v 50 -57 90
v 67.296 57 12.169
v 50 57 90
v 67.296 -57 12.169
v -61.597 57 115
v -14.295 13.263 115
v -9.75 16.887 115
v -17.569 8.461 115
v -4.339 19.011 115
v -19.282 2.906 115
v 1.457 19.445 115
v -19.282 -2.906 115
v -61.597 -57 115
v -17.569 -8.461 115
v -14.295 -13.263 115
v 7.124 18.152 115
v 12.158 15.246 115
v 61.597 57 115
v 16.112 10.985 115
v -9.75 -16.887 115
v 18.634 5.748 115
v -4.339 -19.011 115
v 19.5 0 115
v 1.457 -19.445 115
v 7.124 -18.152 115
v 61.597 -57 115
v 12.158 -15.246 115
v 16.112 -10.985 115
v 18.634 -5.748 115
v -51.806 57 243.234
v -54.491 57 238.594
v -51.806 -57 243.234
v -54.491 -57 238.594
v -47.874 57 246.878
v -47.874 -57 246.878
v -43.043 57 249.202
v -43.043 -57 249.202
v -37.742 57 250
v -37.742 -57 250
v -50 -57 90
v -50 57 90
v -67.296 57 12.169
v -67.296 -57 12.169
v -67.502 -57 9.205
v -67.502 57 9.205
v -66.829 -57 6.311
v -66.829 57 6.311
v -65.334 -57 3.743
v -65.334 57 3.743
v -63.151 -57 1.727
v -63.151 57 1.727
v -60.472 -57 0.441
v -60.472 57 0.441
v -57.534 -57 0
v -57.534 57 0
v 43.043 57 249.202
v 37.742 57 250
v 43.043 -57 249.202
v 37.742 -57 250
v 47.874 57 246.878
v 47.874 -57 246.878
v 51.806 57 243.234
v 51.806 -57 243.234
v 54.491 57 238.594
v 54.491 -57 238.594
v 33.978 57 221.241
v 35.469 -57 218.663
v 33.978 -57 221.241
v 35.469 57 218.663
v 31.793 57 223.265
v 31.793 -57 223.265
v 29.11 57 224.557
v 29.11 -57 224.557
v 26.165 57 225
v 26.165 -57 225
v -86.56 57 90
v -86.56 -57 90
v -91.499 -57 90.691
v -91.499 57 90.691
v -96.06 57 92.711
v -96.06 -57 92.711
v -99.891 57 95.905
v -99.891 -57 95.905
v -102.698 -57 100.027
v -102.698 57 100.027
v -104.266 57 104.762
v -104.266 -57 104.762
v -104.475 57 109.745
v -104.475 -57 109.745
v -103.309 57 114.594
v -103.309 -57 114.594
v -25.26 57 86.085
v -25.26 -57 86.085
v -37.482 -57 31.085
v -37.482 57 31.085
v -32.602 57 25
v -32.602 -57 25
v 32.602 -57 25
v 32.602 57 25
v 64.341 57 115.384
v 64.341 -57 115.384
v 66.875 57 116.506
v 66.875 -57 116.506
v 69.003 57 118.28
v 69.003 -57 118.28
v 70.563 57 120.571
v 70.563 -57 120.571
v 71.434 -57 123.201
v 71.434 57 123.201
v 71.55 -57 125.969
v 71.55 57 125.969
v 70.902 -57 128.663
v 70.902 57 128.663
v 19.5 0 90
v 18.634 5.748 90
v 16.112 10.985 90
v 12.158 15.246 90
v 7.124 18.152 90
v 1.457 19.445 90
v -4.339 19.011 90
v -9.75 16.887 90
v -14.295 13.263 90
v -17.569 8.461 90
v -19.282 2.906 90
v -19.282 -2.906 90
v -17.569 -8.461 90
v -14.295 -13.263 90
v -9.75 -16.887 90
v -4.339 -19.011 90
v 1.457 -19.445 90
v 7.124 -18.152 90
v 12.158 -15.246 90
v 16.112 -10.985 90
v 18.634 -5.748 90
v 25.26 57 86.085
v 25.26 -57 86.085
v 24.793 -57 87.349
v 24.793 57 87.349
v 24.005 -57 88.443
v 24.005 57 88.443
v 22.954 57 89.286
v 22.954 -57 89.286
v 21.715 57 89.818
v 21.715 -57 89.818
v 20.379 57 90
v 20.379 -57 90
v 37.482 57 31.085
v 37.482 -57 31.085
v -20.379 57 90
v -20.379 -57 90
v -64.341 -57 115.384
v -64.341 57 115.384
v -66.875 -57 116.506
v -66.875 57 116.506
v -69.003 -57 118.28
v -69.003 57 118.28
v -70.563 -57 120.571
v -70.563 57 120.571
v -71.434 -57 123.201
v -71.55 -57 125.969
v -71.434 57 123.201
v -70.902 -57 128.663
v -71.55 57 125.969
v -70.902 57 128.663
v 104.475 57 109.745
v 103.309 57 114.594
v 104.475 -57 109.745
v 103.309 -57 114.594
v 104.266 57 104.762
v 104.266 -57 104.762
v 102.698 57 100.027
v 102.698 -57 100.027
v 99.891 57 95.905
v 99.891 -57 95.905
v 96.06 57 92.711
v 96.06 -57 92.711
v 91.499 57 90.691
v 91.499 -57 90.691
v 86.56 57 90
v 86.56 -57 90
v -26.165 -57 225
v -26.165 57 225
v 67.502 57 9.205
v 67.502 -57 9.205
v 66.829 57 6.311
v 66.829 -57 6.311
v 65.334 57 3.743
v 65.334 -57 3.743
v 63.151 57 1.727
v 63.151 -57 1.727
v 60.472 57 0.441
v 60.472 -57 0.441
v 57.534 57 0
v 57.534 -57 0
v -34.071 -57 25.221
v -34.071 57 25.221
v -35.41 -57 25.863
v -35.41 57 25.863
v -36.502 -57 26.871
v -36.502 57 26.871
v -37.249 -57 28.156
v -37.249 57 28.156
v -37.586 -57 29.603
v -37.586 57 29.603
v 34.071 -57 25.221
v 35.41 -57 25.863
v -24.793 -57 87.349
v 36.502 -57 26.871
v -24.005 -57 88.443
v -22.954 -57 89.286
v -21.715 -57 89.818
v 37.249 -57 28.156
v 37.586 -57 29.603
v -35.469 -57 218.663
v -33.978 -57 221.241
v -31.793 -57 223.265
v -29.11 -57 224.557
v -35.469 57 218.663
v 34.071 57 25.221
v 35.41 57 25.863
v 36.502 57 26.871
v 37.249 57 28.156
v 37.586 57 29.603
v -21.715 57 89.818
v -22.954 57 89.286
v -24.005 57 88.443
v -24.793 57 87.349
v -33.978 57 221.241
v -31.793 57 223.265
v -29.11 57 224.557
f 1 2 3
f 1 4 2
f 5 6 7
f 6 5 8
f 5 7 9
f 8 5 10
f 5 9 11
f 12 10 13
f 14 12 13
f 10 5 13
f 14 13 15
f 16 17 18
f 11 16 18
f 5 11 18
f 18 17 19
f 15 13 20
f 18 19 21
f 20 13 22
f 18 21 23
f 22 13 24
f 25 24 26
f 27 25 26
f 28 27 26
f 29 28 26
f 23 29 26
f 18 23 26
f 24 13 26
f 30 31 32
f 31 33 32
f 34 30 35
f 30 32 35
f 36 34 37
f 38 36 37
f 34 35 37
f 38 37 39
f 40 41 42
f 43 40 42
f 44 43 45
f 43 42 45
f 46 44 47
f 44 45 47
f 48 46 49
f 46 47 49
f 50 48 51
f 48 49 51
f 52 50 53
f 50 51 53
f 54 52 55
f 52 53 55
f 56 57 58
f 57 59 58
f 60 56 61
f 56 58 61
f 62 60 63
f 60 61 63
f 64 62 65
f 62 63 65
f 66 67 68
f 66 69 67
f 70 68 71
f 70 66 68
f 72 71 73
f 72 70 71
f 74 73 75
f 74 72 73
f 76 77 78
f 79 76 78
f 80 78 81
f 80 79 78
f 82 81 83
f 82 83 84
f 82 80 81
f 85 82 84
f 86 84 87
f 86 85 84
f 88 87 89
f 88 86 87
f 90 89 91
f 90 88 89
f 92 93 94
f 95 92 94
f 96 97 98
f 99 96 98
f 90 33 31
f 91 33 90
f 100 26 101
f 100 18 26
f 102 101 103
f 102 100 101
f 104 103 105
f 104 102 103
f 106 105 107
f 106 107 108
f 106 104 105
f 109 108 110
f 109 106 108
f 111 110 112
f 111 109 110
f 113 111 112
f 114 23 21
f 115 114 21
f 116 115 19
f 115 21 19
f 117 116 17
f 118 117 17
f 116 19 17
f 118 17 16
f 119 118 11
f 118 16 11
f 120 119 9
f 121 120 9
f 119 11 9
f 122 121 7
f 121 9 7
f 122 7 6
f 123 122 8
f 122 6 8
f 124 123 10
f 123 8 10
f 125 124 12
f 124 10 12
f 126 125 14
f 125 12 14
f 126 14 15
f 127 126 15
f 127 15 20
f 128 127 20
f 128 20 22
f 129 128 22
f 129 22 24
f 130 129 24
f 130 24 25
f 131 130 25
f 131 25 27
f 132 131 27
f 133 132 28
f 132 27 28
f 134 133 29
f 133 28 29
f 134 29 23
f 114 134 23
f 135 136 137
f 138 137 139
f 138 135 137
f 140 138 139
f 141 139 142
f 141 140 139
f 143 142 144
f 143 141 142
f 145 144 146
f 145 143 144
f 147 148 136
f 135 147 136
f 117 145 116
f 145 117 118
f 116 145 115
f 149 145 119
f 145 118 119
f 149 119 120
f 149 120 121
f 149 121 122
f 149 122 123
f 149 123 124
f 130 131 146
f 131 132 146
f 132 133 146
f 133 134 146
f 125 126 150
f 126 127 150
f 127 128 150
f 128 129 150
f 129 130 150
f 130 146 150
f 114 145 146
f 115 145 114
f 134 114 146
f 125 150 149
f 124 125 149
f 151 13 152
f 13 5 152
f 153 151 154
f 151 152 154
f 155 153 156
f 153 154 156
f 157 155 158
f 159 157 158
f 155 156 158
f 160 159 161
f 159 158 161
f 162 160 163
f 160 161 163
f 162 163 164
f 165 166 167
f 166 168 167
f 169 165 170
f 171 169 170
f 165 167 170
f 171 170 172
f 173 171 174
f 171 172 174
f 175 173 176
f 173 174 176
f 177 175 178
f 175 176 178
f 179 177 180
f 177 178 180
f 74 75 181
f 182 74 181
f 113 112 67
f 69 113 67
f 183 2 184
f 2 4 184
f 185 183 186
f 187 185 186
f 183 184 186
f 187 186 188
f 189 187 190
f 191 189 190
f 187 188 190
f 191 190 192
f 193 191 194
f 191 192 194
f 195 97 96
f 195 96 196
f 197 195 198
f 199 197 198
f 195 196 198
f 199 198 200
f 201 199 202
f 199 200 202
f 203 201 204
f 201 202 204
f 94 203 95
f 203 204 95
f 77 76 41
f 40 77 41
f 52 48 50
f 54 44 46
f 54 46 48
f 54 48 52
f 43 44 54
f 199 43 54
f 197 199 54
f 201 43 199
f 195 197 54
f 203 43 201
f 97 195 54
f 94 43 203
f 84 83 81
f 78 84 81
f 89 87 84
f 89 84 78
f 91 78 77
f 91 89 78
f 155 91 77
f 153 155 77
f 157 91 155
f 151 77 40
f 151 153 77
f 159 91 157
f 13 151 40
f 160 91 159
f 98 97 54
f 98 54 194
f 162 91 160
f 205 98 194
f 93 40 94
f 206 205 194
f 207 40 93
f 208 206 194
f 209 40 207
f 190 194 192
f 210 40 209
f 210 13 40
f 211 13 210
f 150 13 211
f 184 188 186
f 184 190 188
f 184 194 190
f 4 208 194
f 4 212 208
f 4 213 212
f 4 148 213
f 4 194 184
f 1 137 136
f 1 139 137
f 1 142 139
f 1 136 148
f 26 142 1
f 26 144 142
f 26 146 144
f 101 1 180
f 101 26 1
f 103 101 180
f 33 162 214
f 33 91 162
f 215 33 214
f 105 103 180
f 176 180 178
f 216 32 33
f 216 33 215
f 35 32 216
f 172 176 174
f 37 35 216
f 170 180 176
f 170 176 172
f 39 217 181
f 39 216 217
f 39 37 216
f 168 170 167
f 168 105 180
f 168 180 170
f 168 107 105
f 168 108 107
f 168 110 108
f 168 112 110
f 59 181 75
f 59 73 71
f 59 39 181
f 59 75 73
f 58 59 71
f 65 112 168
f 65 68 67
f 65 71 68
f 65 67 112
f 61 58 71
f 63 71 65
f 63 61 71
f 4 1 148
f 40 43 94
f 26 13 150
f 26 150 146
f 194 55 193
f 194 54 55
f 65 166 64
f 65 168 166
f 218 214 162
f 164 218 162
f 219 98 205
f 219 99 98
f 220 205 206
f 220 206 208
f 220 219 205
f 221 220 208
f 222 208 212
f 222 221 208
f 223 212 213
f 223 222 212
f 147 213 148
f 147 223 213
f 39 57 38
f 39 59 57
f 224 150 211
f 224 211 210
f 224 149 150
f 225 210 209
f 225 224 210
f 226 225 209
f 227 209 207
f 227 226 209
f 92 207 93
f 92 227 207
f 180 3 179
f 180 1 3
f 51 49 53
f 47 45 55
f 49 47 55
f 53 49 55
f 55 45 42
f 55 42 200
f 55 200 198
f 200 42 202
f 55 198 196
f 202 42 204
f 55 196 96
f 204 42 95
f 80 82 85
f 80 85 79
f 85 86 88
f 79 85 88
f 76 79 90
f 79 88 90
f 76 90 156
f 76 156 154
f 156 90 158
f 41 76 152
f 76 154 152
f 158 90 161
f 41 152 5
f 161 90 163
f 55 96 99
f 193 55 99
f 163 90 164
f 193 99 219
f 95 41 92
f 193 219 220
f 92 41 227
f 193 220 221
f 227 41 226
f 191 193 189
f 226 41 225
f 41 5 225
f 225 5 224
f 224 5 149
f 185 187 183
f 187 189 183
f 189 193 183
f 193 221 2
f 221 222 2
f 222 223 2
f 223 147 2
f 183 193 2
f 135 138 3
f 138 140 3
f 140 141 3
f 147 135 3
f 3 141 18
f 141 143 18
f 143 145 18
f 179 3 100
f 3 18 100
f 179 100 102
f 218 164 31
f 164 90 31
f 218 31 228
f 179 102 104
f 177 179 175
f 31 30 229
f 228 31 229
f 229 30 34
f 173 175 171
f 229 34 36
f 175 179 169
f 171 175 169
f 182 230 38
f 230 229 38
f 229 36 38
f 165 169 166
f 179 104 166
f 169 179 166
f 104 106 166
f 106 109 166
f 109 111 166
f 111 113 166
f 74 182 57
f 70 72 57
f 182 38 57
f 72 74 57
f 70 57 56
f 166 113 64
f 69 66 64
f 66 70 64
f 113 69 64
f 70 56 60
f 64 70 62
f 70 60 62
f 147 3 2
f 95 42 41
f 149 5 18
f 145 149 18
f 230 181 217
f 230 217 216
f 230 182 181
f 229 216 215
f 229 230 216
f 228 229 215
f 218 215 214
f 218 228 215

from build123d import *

# Parameters (mm, degrees)
F1_DEPTH  = 57
F2_R      = 18
F3_R      = 10
F5_DEPTH  = 114
F6_R      = 5
F8_DEPTH  = 114
F9_R      = 10
F10_R     = 19.5
F11_DEPTH = 25


with BuildPart() as f1:
    # F0 (on Front) → F1 (new body, symmetric)
    with BuildSketch(Plane.XZ):
        Polygon((-70, 0), (70, 0), (50, 90), (112.991273, 90), (50, 250), (-50, 250), (-112.991273, 90), (-50, 90), align=None)
    extrude(amount=F1_DEPTH, both=True)

    # F2
    f2_edges = [f1.edges().sort_by_distance(p)[0] for p in [
        (50, 0, 250),
        (-50, 0, 250),
        (112.991273, 0, 90),
        (-112.991273, 0, 90),
    ]]
    fillet(f2_edges, radius=F2_R)

    # F3
    f3_edges = [f1.edges().sort_by_distance(p)[0] for p in [
        (70, 0, 0),
        (-70, 0, 0),
    ]]
    fillet(f3_edges, radius=F3_R)

    # F4 (on face) → F5 (cut, through all)
    with BuildSketch(Plane.XZ.offset(57)):
        Polygon((-38.834599, 25), (38.834599, 25), (24.390154, 90), (-24.390154, 90), align=None)
    extrude(amount=-F5_DEPTH, mode=Mode.SUBTRACT)

    # F6
    f6_edges = [f1.edges().sort_by_distance(p)[0] for p in [
        (-38.834599, 0, 25),
        (38.834599, 0, 25),
        (-24.390154, 0, 90),
        (24.390154, 0, 90),
    ]]
    fillet(f6_edges, radius=F6_R)

    # F7 (on face) → F8 (cut, through all)
    with BuildSketch(Plane.XZ.offset(57)):
        Polygon((-76.281201, 115), (76.281201, 115), (32.9747, 225), (-32.9747, 225), align=None)
    extrude(amount=-F8_DEPTH, mode=Mode.SUBTRACT)

    # F9
    f9_edges = [f1.edges().sort_by_distance(p)[0] for p in [
        (-76.281201, 0, 115),
        (76.281201, 0, 115),
        (32.9747, 0, 225),
        (-32.9747, 0, 225),
    ]]
    fillet(f9_edges, radius=F9_R)

    # F10 (on face) → F11 (cut, through all)
    with BuildSketch(Plane.XY.offset(115)):
        Circle(F10_R)
    extrude(amount=-F11_DEPTH, mode=Mode.SUBTRACT)


solid = f1.part
